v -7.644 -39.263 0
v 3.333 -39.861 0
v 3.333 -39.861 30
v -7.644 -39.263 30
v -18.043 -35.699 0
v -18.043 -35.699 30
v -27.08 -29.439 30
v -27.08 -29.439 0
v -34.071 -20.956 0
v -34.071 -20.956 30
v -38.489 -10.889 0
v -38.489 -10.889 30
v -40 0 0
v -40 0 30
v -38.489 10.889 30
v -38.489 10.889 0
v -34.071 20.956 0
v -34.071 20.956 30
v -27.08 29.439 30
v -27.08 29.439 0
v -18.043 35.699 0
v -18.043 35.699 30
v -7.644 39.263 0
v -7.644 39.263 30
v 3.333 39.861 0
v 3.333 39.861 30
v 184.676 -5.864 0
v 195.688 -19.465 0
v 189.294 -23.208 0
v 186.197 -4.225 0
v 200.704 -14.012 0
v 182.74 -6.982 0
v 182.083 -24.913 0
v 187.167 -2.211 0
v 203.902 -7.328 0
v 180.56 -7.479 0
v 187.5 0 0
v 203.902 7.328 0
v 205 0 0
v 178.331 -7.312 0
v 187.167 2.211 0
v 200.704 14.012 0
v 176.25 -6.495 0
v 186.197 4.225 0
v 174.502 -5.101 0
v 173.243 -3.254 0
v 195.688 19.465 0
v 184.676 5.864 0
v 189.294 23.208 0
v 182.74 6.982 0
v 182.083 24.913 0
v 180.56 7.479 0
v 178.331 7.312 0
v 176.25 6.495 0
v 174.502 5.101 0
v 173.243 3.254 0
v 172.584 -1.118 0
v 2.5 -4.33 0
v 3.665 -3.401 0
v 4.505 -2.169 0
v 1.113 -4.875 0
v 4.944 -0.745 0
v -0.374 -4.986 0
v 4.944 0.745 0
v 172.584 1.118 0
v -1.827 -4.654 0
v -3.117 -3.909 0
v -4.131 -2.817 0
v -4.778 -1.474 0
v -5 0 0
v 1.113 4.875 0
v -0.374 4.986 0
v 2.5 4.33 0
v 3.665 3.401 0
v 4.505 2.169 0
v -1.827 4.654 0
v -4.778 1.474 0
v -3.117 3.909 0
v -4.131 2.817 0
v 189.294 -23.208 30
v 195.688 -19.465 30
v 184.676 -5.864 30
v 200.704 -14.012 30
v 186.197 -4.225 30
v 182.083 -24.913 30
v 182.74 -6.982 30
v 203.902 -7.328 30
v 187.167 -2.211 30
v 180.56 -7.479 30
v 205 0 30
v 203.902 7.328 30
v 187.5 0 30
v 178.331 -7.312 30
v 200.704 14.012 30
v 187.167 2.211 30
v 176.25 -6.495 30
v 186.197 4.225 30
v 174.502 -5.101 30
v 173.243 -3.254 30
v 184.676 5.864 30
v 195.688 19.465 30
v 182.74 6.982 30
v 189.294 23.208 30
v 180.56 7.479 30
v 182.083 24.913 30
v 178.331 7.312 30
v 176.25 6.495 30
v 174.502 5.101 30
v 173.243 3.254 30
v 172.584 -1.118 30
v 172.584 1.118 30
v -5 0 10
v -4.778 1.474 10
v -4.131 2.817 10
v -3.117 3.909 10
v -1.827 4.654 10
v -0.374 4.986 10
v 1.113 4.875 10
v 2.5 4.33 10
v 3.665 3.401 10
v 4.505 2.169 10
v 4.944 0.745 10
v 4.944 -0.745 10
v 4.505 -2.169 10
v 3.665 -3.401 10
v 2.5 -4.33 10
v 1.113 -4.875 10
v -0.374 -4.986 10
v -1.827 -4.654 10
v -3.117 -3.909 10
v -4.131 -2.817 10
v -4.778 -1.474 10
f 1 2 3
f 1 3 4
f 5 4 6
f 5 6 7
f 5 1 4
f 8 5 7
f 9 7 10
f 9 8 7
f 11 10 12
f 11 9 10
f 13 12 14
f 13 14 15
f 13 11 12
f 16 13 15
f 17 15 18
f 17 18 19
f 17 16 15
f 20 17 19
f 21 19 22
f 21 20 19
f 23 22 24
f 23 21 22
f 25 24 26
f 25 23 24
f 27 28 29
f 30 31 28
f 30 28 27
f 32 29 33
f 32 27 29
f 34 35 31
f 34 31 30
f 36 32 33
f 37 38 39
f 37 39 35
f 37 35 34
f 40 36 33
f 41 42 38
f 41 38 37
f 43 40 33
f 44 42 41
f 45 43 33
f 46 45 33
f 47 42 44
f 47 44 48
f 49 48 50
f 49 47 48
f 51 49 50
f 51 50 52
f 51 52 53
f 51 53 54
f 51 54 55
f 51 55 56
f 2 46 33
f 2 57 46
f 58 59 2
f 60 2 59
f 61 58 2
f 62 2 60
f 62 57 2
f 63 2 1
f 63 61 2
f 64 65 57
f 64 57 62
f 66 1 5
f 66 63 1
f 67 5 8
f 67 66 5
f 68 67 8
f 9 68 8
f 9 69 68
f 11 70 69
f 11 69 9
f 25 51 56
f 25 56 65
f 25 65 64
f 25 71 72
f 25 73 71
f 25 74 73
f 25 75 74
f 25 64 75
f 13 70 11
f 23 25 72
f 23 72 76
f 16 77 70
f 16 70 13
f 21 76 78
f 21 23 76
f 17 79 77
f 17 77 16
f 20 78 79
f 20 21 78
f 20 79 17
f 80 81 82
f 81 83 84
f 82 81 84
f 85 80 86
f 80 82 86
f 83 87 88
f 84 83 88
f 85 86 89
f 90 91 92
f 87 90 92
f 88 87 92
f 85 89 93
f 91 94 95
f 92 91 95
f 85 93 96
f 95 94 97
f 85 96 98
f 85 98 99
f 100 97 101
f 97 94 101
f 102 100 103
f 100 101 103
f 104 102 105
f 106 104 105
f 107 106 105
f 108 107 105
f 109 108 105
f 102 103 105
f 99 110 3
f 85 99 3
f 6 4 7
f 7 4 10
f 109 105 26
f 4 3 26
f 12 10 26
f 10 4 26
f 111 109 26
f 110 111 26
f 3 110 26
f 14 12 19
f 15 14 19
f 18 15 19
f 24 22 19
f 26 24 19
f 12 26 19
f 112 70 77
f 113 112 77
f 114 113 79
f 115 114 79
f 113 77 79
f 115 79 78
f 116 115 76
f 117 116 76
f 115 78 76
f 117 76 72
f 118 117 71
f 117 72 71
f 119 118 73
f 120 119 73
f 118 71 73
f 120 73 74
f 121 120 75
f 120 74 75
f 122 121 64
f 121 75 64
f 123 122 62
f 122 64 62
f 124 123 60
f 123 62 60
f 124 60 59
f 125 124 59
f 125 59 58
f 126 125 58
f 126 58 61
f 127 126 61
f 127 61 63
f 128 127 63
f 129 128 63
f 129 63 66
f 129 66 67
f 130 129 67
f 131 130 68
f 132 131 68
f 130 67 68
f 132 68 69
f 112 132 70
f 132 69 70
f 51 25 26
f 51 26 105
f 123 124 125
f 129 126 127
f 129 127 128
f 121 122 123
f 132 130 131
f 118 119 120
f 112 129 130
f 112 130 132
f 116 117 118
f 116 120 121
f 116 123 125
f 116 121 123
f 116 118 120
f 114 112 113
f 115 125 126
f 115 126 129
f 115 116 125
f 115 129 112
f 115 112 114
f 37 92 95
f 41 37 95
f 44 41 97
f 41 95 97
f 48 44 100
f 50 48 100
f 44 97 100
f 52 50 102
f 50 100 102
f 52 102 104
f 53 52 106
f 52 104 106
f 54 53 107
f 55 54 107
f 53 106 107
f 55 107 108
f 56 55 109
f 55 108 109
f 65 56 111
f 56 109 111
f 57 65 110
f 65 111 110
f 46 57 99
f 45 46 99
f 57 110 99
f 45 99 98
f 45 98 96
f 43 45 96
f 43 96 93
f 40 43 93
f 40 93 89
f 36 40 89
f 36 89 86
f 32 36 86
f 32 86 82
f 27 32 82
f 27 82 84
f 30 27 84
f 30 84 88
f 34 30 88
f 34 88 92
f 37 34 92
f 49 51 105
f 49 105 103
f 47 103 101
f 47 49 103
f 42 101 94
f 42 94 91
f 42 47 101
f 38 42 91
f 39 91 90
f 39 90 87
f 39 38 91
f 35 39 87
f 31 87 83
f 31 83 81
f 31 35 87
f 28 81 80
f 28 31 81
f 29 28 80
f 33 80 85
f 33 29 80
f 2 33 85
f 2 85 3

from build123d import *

# Parameters (mm, degrees)
BOSS_EXTRUDE1_DEPTH = 30
SKETCH2_R           = 5
CUT_EXTRUDE1_DEPTH  = 10
SKETCH3_R           = 7.5
CUT_EXTRUDE2_DEPTH  = 69


with BuildPart() as part:
    # Sketch1 → Boss-Extrude1 (new body)
    with BuildSketch(Plane.XY):
        with BuildLine():
            Line((3.333333333, 39.860869144), (182.083333333, 24.913043215))
            ThreePointArc((182.083333333, 24.913043215), (205, 0), (182.083333333, -24.913043215))
            Line((182.083333333, -24.913043215), (3.333333333, -39.860869144))
            ThreePointArc((3.333333333, -39.860869144), (-40, 0), (3.333333333, 39.860869144))
        make_face()
    extrude(amount=BOSS_EXTRUDE1_DEPTH)

    # Sketch2 → Cut-Extrude1 (cut)
    with BuildSketch(Plane(origin=(0, 0, 0), x_dir=(-1, 0, 0), z_dir=(0, 0, -1))):
        Circle(SKETCH2_R)
    extrude(amount=-CUT_EXTRUDE1_DEPTH, mode=Mode.SUBTRACT)

    # Sketch3 → Cut-Extrude2 (cut)
    with BuildSketch(Plane.XY.offset(30)):
        with Locations((180, 0)):
            Circle(SKETCH3_R)
    extrude(amount=-CUT_EXTRUDE2_DEPTH, mode=Mode.SUBTRACT)


solid = part.part
